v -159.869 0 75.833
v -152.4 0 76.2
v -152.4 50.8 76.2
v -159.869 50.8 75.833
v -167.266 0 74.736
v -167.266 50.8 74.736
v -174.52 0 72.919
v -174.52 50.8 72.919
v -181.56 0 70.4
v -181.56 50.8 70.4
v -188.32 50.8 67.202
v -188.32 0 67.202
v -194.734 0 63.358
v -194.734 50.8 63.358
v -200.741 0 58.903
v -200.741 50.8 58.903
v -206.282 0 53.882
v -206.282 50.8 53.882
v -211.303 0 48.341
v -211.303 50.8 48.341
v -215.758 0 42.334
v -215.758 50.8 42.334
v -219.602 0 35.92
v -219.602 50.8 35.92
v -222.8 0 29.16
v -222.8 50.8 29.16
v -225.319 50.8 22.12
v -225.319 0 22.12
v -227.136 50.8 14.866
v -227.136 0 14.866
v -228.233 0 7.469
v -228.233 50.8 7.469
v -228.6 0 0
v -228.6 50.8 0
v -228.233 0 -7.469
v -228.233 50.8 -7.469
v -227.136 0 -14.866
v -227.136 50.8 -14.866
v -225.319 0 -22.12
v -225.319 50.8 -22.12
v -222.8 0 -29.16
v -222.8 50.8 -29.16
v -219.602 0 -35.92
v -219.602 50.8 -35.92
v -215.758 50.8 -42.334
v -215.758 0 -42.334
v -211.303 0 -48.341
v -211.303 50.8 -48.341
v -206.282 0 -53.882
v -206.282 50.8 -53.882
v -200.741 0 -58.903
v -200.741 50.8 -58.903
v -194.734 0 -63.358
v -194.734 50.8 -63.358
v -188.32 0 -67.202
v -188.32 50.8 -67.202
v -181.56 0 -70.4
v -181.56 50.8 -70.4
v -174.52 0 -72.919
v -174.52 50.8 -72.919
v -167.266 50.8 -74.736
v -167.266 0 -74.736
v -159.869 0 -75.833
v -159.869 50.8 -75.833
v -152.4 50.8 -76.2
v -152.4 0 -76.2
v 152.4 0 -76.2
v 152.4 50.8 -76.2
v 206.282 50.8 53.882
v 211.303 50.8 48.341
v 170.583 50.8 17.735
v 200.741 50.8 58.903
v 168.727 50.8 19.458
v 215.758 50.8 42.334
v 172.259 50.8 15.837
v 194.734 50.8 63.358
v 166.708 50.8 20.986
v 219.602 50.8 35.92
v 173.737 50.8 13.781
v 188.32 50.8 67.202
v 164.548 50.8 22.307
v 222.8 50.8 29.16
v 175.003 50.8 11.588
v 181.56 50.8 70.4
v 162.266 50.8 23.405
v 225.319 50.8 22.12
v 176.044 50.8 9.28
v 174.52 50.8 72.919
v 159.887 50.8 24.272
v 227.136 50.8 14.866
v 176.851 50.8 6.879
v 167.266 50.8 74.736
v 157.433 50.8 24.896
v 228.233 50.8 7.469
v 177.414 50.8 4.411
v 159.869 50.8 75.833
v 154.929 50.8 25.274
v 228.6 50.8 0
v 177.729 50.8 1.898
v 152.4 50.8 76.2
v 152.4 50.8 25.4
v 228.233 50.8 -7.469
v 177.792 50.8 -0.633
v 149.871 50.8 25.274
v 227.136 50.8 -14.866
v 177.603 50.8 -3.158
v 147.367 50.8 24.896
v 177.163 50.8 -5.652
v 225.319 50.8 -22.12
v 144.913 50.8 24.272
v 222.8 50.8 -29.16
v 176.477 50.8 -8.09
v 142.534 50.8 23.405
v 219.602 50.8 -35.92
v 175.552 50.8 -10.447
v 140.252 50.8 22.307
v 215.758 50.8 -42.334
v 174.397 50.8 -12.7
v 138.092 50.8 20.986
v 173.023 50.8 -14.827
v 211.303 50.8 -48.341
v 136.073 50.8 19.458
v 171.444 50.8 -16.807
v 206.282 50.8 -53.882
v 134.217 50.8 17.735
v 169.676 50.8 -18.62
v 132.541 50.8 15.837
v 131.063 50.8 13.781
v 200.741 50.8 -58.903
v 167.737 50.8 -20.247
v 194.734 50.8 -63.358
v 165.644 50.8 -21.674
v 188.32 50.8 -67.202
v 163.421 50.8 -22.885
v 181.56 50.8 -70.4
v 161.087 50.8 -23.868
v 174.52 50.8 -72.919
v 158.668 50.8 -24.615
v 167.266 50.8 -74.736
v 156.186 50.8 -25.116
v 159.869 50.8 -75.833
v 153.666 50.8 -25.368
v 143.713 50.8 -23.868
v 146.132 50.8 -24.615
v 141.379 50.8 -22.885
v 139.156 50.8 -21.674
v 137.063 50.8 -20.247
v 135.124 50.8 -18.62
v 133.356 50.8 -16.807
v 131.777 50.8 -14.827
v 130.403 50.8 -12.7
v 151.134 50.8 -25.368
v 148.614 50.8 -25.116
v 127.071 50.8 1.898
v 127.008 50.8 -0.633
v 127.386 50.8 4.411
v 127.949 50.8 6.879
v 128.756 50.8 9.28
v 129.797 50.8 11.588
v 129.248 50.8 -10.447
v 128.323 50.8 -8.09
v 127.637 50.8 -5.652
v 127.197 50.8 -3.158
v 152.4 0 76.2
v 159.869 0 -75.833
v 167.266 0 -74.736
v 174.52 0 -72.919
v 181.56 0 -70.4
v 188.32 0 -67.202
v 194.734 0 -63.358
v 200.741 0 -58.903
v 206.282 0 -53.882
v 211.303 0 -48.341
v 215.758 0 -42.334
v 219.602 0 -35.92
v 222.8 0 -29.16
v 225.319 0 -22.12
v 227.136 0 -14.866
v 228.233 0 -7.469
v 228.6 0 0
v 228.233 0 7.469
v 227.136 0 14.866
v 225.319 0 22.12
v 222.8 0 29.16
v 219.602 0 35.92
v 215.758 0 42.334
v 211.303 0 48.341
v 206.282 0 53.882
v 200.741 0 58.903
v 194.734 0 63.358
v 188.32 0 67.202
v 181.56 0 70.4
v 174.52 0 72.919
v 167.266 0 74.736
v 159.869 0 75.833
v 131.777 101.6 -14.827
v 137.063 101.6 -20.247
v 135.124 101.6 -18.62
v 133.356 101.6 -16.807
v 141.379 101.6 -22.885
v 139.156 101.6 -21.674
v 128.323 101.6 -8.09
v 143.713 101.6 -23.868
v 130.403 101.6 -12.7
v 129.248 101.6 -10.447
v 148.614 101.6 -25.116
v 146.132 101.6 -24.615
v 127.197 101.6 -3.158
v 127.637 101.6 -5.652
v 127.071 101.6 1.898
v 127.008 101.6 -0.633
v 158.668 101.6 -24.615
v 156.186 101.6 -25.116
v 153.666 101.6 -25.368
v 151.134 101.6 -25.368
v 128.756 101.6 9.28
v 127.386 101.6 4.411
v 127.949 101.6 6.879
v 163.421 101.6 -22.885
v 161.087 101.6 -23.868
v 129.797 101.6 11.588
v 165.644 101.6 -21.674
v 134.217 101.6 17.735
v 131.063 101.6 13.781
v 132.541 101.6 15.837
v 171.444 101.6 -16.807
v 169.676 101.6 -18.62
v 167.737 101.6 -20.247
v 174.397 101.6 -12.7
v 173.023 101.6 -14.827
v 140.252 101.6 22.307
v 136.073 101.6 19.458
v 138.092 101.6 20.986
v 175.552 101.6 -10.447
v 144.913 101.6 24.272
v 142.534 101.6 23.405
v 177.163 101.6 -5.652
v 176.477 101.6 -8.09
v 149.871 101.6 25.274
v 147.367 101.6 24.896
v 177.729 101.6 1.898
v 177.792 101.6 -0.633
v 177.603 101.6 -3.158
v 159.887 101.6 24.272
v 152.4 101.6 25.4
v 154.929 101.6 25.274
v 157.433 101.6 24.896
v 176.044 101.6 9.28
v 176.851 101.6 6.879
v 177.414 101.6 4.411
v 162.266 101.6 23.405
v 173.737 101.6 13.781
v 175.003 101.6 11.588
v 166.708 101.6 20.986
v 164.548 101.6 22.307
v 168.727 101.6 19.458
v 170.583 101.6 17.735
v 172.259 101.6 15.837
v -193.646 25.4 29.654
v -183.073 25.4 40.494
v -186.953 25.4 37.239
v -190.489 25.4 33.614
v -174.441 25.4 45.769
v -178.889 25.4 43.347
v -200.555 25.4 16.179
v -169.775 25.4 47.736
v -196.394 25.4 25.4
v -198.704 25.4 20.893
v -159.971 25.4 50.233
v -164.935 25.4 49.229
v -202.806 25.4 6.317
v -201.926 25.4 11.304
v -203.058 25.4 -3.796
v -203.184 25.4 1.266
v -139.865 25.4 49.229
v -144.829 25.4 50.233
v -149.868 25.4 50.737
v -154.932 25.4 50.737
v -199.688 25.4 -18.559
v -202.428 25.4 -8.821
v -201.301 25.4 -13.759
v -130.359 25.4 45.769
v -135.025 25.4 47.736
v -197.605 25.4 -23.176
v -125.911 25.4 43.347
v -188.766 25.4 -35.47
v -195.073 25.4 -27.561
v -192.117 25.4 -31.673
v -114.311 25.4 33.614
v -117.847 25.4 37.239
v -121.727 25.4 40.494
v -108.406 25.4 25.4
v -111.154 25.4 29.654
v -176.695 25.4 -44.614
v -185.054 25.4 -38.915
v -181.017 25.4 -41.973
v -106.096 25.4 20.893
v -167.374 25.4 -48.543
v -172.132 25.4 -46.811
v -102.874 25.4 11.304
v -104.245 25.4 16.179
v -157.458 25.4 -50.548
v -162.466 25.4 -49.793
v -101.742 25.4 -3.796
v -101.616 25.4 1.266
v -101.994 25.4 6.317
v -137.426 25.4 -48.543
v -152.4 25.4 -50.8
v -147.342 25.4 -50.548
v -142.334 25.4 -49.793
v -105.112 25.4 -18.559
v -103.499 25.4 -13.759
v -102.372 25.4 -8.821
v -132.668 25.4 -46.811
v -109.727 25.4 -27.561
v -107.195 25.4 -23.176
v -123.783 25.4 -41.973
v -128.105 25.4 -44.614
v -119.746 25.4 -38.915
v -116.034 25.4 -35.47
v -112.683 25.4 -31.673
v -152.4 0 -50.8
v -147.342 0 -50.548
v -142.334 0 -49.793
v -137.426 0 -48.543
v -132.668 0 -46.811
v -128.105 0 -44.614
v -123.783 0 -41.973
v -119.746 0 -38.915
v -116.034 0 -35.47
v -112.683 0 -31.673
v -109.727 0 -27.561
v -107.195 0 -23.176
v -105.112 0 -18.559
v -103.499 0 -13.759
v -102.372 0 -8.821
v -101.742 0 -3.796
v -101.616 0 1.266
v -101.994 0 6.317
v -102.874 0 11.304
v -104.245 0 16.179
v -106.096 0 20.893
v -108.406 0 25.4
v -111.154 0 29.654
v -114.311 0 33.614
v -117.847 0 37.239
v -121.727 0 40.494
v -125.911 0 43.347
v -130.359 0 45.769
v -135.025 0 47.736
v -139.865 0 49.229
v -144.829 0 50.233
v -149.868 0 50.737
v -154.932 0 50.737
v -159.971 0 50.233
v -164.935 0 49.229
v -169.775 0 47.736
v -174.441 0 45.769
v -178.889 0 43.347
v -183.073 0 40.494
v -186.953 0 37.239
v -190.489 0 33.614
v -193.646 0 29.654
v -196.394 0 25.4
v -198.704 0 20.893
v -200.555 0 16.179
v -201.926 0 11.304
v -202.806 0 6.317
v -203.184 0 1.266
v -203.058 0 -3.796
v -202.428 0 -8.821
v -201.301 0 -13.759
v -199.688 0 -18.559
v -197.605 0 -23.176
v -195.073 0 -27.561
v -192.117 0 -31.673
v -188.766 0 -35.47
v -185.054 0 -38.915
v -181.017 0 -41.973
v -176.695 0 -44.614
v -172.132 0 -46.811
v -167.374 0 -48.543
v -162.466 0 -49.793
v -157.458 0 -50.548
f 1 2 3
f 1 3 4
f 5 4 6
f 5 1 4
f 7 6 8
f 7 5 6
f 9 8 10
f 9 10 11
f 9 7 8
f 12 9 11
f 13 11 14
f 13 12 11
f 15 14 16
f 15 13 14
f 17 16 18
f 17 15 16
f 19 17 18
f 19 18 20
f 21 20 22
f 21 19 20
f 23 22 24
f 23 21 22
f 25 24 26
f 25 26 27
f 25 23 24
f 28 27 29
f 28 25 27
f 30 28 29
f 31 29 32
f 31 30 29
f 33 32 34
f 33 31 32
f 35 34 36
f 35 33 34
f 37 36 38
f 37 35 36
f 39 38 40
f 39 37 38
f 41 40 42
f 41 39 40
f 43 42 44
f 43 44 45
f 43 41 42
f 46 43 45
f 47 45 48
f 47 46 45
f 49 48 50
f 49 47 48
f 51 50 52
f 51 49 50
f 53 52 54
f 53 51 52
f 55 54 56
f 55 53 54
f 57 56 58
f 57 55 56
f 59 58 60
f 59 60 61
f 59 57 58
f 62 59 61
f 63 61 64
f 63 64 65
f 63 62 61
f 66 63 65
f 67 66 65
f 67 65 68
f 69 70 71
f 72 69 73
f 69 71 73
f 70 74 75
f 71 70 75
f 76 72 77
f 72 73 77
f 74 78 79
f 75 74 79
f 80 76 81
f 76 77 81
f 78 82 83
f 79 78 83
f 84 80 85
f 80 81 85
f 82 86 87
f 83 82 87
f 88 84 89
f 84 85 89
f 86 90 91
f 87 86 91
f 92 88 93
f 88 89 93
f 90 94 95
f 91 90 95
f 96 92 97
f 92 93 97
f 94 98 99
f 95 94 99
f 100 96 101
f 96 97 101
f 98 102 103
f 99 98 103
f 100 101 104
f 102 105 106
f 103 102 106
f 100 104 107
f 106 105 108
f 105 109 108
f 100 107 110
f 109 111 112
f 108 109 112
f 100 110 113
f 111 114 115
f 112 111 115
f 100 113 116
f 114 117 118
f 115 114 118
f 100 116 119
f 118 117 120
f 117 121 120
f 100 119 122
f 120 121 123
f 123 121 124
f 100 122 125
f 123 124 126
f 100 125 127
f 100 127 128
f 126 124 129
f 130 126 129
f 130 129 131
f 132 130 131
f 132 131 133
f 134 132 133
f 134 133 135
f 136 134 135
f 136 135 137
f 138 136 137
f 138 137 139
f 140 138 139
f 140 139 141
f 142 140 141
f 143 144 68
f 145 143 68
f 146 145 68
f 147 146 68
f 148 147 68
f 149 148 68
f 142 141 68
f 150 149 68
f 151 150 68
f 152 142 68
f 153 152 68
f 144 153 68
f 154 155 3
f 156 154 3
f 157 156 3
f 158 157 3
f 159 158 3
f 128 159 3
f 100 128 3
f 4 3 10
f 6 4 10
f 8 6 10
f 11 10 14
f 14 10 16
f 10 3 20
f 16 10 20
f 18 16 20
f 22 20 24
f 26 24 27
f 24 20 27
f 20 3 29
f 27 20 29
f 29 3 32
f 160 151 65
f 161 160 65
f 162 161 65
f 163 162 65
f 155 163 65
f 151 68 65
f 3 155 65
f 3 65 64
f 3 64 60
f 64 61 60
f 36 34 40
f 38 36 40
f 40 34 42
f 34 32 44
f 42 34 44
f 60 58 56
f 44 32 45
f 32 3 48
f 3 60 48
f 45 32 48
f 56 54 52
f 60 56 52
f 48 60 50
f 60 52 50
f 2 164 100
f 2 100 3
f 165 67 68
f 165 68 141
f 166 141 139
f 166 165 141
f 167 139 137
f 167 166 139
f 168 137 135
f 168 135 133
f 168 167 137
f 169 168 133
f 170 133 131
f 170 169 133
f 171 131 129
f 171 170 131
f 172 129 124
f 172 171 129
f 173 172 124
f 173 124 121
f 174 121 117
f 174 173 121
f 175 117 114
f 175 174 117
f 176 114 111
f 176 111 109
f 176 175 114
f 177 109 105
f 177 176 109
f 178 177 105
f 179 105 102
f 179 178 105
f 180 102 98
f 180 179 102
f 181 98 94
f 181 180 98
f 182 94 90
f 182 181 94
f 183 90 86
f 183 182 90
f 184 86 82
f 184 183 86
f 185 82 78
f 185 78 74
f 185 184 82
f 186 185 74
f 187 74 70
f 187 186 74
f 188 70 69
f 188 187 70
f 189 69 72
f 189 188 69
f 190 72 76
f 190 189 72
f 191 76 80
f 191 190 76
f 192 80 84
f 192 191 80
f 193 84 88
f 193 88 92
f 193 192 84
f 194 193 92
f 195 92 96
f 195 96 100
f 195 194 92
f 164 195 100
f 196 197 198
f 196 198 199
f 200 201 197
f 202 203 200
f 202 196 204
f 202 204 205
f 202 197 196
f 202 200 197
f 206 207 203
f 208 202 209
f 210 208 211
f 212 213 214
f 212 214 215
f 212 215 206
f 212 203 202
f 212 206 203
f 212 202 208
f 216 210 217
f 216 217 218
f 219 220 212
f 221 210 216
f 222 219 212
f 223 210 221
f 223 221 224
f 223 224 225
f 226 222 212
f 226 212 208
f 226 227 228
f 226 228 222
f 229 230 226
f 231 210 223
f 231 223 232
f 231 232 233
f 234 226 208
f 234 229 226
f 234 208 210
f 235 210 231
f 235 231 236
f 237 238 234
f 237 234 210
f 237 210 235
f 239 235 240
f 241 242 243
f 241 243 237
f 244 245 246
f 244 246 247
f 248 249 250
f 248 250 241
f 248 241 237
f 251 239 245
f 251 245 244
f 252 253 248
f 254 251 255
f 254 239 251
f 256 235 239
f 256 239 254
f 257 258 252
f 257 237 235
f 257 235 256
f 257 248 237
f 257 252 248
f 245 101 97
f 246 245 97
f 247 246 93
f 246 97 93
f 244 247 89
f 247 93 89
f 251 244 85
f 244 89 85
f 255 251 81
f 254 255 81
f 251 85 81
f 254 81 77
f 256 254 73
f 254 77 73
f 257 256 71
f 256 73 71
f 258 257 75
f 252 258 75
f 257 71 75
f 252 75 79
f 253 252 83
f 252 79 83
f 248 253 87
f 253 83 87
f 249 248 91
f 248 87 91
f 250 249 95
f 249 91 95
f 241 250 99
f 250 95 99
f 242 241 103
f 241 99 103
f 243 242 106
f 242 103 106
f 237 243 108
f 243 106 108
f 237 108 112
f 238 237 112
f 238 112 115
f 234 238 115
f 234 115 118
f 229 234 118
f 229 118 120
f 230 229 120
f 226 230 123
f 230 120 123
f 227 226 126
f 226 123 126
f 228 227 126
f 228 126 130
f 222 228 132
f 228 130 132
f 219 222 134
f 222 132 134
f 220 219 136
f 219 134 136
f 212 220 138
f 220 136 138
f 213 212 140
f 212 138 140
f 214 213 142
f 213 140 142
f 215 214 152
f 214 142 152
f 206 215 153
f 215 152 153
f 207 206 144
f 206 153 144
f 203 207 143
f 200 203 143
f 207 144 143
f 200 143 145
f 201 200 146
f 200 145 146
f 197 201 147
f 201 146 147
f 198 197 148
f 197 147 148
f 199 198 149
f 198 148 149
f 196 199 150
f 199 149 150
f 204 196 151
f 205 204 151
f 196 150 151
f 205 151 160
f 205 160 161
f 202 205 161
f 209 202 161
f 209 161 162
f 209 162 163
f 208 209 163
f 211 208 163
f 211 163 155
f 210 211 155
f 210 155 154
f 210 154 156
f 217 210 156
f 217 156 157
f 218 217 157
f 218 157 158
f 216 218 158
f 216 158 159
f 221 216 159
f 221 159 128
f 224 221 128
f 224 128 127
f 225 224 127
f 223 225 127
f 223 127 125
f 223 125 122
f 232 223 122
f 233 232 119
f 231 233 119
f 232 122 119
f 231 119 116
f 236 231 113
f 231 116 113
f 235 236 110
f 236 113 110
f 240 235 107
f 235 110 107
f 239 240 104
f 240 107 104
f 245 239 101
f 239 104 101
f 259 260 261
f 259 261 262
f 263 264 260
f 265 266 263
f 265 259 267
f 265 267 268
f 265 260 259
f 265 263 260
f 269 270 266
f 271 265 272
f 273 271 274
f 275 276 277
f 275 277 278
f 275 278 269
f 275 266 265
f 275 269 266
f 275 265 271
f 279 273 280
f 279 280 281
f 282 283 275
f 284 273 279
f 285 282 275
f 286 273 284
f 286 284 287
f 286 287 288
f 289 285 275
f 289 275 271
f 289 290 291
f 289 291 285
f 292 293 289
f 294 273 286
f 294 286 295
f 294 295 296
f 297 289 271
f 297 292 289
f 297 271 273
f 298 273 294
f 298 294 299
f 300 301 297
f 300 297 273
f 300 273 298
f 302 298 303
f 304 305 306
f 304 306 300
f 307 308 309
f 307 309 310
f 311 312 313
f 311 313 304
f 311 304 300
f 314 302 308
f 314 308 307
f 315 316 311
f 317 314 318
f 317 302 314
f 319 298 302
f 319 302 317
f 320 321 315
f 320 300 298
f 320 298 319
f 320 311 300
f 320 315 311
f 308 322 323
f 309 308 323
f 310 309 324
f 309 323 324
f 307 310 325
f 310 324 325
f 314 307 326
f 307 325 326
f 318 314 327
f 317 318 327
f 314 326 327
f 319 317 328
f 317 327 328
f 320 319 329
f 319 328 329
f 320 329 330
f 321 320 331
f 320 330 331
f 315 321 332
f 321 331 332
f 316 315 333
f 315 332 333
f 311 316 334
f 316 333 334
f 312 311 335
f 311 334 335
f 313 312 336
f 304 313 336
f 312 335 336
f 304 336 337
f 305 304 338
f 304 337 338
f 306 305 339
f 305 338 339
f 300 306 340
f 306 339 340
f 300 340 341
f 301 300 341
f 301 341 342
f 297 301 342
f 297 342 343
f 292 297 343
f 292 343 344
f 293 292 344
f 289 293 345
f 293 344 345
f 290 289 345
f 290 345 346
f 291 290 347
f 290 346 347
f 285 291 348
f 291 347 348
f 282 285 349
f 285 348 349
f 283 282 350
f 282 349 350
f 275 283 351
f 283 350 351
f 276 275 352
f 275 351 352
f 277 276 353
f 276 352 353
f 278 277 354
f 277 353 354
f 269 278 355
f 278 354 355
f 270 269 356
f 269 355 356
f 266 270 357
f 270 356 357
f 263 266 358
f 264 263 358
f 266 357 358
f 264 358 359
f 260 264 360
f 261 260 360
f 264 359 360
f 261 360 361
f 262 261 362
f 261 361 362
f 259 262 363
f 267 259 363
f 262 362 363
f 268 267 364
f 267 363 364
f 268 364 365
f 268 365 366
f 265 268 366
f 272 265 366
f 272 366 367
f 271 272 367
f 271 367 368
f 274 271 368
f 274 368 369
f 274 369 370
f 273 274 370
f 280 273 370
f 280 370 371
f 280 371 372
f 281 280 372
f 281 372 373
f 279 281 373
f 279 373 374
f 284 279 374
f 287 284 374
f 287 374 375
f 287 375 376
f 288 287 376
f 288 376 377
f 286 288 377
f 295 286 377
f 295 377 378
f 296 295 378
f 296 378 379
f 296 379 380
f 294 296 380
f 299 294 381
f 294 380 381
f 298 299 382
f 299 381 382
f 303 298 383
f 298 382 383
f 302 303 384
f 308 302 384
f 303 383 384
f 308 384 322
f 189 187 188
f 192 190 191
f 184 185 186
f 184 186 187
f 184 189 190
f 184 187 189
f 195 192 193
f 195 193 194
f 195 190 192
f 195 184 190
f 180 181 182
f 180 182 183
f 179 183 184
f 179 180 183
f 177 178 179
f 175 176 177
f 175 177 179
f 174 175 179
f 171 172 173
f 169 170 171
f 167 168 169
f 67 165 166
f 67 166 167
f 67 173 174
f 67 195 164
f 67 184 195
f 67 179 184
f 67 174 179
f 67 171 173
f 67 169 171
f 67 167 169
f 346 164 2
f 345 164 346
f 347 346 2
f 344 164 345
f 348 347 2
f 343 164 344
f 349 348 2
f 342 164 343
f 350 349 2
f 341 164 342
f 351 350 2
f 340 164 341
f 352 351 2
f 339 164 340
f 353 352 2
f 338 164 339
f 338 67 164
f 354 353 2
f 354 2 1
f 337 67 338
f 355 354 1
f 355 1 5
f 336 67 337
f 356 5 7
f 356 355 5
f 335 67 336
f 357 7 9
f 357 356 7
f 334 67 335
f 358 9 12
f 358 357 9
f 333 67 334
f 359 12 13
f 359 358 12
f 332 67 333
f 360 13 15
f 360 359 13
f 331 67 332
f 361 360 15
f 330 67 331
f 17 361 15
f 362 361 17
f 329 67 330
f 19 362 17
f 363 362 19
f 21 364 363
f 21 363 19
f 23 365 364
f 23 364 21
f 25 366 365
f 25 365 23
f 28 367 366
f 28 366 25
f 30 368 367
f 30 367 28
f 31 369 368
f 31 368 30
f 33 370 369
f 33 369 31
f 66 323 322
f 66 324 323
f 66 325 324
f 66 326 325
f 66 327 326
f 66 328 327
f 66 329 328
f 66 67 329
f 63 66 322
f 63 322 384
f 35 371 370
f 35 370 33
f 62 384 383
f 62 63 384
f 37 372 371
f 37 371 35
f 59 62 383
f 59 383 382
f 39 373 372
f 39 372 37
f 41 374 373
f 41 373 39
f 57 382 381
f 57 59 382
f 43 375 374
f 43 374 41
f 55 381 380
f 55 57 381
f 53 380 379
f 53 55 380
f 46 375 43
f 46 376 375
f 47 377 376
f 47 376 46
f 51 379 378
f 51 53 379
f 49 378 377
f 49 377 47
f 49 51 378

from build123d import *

# Parameters (mm, degrees)
LINK1_DEPTH         = 50.8
SKETCH2_R           = 50.8
BOTTOMCUT_DEPTH     = 25.4
SKETCH3_R           = 25.4
BOSS_EXTRUDE1_DEPTH = 50.8


with BuildPart() as part:
    # Sketch1 → link1 (new body)
    with BuildSketch(Plane(origin=(0, 0, 0), x_dir=(1, 0, 0), z_dir=(0, 1, 0))):
        with BuildLine():
            Line((-152.4, 76.2), (152.4, 76.2))
            ThreePointArc((152.4, 76.2), (228.6, 0), (152.4, -76.2))
            Line((152.4, -76.2), (-152.4, -76.2))
            ThreePointArc((-152.4, -76.2), (-228.6, 0), (-152.4, 76.2))
        make_face()
    extrude(amount=LINK1_DEPTH)

    # Sketch2 → bottomcut (cut)
    with BuildSketch(Plane.XZ):
        with Locations(Location((-152.4, 0, 0), (0, 0, 270))):
            Circle(SKETCH2_R)
    extrude(amount=-BOTTOMCUT_DEPTH, mode=Mode.SUBTRACT)

    # Sketch3 → Boss-Extrude1 (add)
    with BuildSketch(Plane(origin=(0, 50.8, 0), x_dir=(1, 0, 0), z_dir=(0, 1, 0))):
        with Locations(Location((152.4, 0, 0), (0, 0, 270))):
            Circle(SKETCH3_R)
    extrude(amount=BOSS_EXTRUDE1_DEPTH)


solid = part.part
